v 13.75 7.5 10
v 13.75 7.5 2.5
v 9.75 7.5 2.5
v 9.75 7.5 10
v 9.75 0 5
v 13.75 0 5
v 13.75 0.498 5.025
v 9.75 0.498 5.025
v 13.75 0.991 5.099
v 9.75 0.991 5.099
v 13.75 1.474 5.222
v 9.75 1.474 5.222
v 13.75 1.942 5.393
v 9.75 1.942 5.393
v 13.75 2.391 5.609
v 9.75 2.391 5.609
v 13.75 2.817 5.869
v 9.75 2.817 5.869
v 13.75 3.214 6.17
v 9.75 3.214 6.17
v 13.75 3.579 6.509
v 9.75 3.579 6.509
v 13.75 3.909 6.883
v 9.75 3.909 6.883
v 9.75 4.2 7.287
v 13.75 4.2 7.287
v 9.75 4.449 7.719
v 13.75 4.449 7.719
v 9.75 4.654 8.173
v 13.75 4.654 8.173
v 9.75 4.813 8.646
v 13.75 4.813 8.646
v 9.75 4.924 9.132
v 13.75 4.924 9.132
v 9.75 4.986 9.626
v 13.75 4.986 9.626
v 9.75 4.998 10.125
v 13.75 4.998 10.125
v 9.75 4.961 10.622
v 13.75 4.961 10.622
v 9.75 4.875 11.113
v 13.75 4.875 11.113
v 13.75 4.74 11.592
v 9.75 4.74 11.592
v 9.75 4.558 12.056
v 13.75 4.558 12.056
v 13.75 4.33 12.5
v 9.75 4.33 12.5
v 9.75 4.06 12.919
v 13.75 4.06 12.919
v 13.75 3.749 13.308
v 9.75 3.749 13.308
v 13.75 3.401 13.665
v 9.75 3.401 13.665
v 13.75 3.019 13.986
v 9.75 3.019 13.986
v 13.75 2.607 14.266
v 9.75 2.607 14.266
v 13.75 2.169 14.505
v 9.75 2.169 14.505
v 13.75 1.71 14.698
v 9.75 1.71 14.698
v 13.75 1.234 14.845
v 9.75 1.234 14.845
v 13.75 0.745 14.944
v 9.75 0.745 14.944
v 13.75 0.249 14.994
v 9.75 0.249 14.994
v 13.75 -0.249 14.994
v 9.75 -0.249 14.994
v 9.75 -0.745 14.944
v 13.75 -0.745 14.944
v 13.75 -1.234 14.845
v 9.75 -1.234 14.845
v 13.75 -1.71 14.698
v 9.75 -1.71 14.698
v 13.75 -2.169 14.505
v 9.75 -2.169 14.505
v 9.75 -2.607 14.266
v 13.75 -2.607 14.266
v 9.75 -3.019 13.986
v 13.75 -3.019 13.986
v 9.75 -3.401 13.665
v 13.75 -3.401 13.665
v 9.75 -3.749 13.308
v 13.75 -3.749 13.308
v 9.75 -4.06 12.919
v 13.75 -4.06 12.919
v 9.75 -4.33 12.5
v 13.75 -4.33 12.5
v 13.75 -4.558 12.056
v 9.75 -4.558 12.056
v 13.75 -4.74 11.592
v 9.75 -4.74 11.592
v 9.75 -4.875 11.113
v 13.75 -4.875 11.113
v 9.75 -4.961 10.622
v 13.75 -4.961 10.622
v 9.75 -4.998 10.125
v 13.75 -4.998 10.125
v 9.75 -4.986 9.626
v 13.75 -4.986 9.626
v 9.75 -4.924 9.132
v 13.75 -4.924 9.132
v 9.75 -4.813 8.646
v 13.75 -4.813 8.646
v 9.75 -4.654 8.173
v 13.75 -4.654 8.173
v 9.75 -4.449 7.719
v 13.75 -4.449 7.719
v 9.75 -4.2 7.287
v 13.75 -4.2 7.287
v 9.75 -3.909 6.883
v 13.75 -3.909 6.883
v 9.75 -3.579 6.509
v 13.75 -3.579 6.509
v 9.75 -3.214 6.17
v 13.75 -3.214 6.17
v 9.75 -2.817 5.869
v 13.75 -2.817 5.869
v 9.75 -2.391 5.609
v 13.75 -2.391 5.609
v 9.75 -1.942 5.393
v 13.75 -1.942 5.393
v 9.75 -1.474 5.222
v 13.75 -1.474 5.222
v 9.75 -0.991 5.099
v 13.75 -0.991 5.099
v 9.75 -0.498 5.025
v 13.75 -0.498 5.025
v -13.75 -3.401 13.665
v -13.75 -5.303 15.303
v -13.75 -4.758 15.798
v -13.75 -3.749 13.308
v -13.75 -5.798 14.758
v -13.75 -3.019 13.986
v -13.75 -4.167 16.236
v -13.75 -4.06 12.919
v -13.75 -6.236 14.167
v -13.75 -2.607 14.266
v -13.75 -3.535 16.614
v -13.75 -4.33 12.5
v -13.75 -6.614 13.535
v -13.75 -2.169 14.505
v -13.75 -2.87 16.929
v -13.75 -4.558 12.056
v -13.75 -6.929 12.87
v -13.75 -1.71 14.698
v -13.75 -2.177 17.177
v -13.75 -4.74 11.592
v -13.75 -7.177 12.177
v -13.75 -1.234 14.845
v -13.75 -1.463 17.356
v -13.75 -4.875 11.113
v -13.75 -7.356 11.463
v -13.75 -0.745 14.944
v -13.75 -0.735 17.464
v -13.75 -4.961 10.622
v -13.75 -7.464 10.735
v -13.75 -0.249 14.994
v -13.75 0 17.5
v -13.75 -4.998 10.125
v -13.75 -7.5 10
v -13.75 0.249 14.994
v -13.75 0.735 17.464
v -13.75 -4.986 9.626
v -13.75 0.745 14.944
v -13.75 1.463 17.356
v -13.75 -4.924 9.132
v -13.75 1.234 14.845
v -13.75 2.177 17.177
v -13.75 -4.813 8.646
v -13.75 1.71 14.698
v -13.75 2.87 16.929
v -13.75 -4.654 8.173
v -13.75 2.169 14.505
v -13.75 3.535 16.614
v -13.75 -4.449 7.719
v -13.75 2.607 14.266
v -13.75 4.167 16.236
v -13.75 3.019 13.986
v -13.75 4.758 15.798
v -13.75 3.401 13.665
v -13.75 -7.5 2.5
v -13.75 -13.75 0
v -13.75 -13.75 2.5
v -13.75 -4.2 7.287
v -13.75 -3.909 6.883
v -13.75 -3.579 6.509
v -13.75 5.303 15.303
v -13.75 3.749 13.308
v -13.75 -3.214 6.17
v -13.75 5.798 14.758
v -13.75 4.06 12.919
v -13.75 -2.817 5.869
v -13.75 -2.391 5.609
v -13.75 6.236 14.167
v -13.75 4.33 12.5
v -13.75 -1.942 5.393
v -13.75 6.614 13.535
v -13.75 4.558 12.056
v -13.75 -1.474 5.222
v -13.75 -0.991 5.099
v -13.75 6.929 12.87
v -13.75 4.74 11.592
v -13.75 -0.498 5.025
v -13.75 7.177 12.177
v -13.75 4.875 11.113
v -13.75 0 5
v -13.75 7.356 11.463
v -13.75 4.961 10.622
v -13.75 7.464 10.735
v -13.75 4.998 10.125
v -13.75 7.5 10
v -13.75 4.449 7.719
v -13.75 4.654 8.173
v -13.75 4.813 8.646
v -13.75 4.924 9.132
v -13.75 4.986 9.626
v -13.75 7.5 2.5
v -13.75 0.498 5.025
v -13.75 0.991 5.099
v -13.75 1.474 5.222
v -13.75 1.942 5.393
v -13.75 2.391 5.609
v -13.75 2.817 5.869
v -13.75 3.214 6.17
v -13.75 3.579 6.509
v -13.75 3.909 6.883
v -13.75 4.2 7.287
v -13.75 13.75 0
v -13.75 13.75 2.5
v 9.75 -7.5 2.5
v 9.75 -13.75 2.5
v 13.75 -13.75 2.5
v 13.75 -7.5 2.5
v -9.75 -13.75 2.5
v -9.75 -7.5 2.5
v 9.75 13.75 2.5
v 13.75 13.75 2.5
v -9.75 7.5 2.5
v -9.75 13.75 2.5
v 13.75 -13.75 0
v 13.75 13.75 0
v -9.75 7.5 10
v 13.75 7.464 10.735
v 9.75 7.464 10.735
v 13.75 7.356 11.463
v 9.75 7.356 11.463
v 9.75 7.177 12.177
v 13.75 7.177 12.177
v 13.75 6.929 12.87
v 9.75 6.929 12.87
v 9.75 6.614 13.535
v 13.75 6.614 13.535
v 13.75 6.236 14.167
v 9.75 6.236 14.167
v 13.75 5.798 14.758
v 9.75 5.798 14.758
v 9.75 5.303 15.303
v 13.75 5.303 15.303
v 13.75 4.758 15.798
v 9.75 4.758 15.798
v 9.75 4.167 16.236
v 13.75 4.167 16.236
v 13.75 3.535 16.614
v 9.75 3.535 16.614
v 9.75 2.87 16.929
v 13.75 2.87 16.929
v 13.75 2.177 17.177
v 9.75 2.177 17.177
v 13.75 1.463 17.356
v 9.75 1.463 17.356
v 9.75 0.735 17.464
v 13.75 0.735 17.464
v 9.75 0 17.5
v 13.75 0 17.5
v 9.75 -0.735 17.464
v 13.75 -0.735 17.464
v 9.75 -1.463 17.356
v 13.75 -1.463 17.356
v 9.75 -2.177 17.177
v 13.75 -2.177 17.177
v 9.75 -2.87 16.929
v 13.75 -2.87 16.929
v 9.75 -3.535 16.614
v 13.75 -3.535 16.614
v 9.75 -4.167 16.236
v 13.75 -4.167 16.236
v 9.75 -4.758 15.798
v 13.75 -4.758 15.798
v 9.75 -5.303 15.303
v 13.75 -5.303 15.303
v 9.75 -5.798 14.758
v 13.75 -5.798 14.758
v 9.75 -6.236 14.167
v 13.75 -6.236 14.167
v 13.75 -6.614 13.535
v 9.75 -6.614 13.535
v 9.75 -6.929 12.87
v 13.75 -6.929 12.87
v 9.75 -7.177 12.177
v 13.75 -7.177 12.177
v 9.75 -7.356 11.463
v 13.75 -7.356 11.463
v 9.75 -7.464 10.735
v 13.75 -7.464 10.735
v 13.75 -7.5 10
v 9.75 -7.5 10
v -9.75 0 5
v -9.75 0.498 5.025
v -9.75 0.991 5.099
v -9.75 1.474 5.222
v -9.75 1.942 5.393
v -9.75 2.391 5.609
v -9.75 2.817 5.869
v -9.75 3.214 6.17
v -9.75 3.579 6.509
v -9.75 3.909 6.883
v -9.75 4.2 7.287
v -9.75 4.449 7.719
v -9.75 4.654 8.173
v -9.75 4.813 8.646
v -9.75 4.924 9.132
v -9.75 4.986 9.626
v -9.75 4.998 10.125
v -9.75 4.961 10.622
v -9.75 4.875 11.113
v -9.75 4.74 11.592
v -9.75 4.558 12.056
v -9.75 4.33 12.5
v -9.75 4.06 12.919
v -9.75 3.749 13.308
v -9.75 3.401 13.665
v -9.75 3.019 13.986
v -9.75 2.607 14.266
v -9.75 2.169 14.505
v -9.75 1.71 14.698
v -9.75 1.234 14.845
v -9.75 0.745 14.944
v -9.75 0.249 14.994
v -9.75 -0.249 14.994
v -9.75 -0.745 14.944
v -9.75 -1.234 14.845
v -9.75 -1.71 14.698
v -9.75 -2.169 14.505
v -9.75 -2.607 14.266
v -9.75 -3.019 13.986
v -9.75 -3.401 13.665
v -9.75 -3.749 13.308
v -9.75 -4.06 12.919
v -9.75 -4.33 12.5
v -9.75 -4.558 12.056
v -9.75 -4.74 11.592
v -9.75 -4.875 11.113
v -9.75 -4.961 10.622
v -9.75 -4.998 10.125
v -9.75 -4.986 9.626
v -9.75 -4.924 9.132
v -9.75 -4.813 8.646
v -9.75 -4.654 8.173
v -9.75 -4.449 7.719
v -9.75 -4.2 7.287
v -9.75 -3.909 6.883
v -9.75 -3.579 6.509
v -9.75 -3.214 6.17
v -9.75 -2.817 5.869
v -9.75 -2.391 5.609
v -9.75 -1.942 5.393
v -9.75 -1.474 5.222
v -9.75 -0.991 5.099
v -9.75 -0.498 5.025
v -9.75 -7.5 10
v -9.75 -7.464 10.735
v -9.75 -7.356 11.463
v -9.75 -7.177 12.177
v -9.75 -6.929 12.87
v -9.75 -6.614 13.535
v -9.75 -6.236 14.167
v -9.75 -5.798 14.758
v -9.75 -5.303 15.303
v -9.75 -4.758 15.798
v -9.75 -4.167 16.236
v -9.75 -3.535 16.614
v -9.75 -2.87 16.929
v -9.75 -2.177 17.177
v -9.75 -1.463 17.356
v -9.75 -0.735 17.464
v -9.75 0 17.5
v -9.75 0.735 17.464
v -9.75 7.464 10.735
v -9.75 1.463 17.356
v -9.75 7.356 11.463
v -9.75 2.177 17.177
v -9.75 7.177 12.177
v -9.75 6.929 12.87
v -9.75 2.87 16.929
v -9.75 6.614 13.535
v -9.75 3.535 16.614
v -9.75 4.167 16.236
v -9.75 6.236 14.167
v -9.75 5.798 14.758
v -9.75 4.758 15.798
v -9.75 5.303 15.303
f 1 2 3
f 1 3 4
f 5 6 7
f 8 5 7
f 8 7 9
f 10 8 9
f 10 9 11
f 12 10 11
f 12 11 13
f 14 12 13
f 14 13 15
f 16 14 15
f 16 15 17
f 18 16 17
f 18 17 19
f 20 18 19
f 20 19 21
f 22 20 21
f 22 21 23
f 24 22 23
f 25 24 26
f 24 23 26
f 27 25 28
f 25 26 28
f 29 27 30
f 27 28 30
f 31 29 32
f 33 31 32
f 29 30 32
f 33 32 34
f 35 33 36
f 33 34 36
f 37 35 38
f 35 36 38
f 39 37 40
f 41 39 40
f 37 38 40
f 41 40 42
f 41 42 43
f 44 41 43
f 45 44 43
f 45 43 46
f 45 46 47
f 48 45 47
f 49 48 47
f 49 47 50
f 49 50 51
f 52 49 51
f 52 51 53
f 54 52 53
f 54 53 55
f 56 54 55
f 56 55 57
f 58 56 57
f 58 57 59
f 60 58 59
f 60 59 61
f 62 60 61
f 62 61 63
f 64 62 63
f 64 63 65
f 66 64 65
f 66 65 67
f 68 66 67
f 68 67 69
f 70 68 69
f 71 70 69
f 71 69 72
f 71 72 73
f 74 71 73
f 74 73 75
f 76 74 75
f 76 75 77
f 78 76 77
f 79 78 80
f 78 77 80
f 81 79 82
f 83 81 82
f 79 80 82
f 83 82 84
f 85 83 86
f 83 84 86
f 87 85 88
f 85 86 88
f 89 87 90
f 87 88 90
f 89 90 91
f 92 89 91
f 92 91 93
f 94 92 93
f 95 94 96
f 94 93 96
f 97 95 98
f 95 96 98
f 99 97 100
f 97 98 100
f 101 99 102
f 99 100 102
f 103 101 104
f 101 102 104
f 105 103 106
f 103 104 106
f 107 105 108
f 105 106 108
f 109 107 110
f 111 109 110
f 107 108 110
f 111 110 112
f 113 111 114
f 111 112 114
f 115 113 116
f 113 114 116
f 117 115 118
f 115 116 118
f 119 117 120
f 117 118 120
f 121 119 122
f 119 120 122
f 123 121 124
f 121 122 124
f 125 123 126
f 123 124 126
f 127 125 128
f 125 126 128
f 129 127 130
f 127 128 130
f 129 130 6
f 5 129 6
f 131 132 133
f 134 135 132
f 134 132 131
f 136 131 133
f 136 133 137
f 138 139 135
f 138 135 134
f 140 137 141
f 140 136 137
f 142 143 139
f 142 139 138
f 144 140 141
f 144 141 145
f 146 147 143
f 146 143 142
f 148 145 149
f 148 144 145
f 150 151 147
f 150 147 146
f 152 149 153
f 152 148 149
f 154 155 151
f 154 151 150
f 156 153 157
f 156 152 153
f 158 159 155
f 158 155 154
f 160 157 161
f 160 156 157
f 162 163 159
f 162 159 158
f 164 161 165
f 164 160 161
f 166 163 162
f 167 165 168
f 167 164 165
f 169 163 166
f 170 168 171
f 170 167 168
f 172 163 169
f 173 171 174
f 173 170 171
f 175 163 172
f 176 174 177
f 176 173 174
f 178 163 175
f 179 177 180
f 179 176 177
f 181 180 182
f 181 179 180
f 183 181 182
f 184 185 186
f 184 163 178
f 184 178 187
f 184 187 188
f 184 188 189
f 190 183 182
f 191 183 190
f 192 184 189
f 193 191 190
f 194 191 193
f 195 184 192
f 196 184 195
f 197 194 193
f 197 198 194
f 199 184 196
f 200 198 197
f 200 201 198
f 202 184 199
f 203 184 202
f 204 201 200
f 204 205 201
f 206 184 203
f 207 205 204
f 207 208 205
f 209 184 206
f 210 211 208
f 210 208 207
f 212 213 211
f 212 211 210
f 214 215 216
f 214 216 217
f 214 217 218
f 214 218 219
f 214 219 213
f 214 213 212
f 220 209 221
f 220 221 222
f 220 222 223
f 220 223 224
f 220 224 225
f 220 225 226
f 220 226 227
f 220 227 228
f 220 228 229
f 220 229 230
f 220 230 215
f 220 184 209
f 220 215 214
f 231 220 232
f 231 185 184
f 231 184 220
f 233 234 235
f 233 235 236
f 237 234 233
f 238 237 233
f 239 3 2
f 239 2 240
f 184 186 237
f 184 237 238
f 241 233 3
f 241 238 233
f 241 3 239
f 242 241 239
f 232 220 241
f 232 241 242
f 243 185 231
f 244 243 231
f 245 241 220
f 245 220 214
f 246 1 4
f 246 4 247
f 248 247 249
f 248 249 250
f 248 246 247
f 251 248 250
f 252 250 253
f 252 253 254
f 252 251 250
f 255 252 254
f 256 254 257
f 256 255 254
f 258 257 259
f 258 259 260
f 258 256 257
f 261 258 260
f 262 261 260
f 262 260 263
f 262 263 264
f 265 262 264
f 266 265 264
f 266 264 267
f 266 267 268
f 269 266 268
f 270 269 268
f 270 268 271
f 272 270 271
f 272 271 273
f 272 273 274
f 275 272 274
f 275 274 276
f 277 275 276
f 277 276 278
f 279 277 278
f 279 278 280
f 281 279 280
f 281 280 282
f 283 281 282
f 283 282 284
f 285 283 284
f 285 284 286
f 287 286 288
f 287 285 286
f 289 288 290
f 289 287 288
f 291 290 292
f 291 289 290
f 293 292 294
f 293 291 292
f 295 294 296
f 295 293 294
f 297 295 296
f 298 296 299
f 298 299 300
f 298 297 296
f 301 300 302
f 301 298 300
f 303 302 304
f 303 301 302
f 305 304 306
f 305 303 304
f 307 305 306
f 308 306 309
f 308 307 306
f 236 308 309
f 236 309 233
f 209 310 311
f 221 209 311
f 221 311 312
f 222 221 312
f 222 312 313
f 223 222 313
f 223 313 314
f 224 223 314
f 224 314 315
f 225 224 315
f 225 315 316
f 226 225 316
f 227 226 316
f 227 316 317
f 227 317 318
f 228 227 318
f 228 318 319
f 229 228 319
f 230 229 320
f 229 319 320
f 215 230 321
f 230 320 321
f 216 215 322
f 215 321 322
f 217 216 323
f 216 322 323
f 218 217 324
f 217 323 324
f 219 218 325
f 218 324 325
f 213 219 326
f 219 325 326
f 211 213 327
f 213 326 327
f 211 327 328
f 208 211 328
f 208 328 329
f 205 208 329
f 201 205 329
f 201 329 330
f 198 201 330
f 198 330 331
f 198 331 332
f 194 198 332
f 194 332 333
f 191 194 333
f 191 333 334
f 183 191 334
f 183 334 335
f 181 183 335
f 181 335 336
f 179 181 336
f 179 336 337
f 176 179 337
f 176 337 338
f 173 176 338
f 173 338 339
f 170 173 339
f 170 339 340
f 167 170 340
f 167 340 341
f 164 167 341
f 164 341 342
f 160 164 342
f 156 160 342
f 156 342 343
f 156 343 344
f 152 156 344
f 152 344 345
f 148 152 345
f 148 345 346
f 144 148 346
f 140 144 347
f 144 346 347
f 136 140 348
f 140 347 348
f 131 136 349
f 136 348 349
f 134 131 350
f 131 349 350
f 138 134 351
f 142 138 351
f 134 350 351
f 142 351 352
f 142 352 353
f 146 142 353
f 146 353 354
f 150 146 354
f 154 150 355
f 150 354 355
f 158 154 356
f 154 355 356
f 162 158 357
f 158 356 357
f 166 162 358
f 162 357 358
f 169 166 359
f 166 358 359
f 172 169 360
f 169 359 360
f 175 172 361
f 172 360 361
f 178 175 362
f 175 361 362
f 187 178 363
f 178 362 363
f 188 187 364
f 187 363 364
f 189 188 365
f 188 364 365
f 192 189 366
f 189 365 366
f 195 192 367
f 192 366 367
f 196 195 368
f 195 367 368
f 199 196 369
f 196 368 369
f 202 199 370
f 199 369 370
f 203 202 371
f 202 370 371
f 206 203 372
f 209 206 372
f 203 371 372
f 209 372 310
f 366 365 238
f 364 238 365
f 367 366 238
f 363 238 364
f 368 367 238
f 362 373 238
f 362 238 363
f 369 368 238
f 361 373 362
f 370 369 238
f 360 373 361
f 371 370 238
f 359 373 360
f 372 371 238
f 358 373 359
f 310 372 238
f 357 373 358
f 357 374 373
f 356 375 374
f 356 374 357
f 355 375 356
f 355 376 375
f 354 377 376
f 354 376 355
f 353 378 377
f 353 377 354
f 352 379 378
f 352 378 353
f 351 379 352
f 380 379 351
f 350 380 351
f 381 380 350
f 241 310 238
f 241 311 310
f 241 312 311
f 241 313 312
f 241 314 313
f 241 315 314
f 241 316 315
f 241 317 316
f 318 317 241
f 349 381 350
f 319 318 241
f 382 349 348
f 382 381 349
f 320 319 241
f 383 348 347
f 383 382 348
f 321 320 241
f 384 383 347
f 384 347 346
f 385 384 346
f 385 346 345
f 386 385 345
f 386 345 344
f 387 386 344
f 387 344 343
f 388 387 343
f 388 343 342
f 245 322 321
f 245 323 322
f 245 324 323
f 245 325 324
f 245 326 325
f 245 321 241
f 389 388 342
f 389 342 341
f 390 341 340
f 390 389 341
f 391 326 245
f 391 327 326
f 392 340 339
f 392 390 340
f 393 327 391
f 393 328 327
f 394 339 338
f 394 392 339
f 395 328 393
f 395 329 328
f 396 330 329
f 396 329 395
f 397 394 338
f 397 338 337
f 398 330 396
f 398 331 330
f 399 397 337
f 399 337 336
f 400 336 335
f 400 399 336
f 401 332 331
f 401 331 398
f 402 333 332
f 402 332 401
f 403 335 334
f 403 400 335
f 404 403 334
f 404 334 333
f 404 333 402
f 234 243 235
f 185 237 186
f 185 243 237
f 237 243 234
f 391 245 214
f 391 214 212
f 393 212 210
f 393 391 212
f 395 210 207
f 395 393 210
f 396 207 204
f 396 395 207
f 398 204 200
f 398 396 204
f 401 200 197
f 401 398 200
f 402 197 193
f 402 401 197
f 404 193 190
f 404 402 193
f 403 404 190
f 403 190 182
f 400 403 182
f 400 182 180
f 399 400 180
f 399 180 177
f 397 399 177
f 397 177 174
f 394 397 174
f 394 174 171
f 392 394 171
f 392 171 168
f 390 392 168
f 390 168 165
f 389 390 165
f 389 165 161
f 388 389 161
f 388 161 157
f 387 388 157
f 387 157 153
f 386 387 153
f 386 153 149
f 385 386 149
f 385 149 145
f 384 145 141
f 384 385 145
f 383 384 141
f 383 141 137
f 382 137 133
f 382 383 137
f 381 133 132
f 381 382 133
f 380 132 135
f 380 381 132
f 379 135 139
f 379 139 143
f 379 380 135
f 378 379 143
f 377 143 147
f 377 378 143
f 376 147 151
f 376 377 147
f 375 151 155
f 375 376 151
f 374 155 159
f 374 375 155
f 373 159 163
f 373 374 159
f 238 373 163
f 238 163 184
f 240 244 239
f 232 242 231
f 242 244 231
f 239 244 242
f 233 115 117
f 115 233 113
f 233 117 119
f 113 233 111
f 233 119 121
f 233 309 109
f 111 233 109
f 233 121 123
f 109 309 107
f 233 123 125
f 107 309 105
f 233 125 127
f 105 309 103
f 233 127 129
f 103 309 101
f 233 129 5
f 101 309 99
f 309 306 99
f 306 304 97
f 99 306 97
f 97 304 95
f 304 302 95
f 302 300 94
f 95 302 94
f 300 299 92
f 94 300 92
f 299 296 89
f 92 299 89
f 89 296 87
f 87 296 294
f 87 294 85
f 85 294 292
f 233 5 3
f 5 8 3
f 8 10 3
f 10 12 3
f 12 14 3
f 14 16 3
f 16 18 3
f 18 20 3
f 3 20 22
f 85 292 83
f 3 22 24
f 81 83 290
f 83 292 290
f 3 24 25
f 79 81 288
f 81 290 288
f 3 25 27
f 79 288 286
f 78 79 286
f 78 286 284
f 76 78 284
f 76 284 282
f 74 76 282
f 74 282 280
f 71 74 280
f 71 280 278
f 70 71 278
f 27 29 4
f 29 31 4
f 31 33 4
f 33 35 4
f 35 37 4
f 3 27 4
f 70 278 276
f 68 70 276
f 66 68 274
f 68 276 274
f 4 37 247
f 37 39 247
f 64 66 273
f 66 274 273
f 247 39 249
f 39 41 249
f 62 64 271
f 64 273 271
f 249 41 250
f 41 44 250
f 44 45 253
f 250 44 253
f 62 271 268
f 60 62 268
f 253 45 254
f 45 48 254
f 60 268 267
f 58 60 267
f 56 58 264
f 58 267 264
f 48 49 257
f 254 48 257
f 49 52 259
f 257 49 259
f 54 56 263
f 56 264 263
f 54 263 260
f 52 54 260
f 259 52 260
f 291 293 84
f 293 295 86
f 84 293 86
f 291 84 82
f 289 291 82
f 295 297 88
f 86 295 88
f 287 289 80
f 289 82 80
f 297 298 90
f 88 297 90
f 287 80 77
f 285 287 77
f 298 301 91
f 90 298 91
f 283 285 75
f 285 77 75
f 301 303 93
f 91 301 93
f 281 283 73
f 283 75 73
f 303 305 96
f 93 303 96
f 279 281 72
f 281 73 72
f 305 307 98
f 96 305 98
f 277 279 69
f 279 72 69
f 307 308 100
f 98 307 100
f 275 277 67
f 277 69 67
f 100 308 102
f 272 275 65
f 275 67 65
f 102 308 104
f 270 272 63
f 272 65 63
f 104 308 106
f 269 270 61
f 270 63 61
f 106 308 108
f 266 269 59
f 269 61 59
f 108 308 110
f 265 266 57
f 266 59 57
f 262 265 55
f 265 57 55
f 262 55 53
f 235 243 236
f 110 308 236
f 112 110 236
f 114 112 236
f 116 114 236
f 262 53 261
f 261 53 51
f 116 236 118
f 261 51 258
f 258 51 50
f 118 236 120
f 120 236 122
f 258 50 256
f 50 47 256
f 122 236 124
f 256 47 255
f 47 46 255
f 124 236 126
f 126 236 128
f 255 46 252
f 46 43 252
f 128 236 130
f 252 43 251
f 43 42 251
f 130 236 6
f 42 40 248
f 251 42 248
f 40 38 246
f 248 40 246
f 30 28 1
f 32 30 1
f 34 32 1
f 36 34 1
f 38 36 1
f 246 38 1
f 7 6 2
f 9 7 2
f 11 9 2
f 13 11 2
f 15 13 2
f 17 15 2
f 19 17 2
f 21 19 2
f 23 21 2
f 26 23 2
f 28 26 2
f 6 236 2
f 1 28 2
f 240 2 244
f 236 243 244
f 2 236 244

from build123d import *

# Parameters (mm, degrees)
SKETCH1_W               = 27.5
SKETCH1_H               = 27.5
BOSS_EXTRUDE1_DEPTH     = 2.5
SKETCH2_R               = 5
BOSS_EXTRUDE2_DEPTH     = 27.5
CUT_EXTRUDE1_DEPTH      = 9.75
CUT_EXTRUDE1_DEPTH_BACK = 9.75
SKETCH3_W               = 27.5
SKETCH3_H               = 15.762918275


with BuildPart() as part:
    # Sketch1 → Boss-Extrude1 (new body)
    with BuildSketch(Plane(origin=(0, 0, 0), x_dir=(0, 1, 0), z_dir=(0, 0, 1))):
        Rectangle(SKETCH1_W, SKETCH1_H)
    extrude(amount=BOSS_EXTRUDE1_DEPTH)

    # Sketch2 → Boss-Extrude2 (add)
    with BuildSketch(Plane.YZ.offset(13.75)):
        with BuildLine():
            Line((-7.5, 2.5), (7.5, 2.5))
            Line((7.5, 2.5), (7.5, 10))
            ThreePointArc((7.5, 10), (0, 17.5), (-7.5, 10))
            Line((-7.5, 10), (-7.5, 2.5))
        make_face()
        with Locations(Location((0, 10, 0), (0, 0, 270))):
            Circle(SKETCH2_R, mode=Mode.SUBTRACT)
    extrude(amount=-BOSS_EXTRUDE2_DEPTH)

    # Sketch3 → Cut-Extrude1 (cut, two sides: drawn at the far end of the back side and taken through both)
    with BuildSketch(Plane.YZ.offset(-CUT_EXTRUDE1_DEPTH_BACK)):
        with Locations((0, 10.381459138)):
            Rectangle(SKETCH3_W, SKETCH3_H)
    extrude(amount=CUT_EXTRUDE1_DEPTH + CUT_EXTRUDE1_DEPTH_BACK, mode=Mode.SUBTRACT)


solid = part.part
